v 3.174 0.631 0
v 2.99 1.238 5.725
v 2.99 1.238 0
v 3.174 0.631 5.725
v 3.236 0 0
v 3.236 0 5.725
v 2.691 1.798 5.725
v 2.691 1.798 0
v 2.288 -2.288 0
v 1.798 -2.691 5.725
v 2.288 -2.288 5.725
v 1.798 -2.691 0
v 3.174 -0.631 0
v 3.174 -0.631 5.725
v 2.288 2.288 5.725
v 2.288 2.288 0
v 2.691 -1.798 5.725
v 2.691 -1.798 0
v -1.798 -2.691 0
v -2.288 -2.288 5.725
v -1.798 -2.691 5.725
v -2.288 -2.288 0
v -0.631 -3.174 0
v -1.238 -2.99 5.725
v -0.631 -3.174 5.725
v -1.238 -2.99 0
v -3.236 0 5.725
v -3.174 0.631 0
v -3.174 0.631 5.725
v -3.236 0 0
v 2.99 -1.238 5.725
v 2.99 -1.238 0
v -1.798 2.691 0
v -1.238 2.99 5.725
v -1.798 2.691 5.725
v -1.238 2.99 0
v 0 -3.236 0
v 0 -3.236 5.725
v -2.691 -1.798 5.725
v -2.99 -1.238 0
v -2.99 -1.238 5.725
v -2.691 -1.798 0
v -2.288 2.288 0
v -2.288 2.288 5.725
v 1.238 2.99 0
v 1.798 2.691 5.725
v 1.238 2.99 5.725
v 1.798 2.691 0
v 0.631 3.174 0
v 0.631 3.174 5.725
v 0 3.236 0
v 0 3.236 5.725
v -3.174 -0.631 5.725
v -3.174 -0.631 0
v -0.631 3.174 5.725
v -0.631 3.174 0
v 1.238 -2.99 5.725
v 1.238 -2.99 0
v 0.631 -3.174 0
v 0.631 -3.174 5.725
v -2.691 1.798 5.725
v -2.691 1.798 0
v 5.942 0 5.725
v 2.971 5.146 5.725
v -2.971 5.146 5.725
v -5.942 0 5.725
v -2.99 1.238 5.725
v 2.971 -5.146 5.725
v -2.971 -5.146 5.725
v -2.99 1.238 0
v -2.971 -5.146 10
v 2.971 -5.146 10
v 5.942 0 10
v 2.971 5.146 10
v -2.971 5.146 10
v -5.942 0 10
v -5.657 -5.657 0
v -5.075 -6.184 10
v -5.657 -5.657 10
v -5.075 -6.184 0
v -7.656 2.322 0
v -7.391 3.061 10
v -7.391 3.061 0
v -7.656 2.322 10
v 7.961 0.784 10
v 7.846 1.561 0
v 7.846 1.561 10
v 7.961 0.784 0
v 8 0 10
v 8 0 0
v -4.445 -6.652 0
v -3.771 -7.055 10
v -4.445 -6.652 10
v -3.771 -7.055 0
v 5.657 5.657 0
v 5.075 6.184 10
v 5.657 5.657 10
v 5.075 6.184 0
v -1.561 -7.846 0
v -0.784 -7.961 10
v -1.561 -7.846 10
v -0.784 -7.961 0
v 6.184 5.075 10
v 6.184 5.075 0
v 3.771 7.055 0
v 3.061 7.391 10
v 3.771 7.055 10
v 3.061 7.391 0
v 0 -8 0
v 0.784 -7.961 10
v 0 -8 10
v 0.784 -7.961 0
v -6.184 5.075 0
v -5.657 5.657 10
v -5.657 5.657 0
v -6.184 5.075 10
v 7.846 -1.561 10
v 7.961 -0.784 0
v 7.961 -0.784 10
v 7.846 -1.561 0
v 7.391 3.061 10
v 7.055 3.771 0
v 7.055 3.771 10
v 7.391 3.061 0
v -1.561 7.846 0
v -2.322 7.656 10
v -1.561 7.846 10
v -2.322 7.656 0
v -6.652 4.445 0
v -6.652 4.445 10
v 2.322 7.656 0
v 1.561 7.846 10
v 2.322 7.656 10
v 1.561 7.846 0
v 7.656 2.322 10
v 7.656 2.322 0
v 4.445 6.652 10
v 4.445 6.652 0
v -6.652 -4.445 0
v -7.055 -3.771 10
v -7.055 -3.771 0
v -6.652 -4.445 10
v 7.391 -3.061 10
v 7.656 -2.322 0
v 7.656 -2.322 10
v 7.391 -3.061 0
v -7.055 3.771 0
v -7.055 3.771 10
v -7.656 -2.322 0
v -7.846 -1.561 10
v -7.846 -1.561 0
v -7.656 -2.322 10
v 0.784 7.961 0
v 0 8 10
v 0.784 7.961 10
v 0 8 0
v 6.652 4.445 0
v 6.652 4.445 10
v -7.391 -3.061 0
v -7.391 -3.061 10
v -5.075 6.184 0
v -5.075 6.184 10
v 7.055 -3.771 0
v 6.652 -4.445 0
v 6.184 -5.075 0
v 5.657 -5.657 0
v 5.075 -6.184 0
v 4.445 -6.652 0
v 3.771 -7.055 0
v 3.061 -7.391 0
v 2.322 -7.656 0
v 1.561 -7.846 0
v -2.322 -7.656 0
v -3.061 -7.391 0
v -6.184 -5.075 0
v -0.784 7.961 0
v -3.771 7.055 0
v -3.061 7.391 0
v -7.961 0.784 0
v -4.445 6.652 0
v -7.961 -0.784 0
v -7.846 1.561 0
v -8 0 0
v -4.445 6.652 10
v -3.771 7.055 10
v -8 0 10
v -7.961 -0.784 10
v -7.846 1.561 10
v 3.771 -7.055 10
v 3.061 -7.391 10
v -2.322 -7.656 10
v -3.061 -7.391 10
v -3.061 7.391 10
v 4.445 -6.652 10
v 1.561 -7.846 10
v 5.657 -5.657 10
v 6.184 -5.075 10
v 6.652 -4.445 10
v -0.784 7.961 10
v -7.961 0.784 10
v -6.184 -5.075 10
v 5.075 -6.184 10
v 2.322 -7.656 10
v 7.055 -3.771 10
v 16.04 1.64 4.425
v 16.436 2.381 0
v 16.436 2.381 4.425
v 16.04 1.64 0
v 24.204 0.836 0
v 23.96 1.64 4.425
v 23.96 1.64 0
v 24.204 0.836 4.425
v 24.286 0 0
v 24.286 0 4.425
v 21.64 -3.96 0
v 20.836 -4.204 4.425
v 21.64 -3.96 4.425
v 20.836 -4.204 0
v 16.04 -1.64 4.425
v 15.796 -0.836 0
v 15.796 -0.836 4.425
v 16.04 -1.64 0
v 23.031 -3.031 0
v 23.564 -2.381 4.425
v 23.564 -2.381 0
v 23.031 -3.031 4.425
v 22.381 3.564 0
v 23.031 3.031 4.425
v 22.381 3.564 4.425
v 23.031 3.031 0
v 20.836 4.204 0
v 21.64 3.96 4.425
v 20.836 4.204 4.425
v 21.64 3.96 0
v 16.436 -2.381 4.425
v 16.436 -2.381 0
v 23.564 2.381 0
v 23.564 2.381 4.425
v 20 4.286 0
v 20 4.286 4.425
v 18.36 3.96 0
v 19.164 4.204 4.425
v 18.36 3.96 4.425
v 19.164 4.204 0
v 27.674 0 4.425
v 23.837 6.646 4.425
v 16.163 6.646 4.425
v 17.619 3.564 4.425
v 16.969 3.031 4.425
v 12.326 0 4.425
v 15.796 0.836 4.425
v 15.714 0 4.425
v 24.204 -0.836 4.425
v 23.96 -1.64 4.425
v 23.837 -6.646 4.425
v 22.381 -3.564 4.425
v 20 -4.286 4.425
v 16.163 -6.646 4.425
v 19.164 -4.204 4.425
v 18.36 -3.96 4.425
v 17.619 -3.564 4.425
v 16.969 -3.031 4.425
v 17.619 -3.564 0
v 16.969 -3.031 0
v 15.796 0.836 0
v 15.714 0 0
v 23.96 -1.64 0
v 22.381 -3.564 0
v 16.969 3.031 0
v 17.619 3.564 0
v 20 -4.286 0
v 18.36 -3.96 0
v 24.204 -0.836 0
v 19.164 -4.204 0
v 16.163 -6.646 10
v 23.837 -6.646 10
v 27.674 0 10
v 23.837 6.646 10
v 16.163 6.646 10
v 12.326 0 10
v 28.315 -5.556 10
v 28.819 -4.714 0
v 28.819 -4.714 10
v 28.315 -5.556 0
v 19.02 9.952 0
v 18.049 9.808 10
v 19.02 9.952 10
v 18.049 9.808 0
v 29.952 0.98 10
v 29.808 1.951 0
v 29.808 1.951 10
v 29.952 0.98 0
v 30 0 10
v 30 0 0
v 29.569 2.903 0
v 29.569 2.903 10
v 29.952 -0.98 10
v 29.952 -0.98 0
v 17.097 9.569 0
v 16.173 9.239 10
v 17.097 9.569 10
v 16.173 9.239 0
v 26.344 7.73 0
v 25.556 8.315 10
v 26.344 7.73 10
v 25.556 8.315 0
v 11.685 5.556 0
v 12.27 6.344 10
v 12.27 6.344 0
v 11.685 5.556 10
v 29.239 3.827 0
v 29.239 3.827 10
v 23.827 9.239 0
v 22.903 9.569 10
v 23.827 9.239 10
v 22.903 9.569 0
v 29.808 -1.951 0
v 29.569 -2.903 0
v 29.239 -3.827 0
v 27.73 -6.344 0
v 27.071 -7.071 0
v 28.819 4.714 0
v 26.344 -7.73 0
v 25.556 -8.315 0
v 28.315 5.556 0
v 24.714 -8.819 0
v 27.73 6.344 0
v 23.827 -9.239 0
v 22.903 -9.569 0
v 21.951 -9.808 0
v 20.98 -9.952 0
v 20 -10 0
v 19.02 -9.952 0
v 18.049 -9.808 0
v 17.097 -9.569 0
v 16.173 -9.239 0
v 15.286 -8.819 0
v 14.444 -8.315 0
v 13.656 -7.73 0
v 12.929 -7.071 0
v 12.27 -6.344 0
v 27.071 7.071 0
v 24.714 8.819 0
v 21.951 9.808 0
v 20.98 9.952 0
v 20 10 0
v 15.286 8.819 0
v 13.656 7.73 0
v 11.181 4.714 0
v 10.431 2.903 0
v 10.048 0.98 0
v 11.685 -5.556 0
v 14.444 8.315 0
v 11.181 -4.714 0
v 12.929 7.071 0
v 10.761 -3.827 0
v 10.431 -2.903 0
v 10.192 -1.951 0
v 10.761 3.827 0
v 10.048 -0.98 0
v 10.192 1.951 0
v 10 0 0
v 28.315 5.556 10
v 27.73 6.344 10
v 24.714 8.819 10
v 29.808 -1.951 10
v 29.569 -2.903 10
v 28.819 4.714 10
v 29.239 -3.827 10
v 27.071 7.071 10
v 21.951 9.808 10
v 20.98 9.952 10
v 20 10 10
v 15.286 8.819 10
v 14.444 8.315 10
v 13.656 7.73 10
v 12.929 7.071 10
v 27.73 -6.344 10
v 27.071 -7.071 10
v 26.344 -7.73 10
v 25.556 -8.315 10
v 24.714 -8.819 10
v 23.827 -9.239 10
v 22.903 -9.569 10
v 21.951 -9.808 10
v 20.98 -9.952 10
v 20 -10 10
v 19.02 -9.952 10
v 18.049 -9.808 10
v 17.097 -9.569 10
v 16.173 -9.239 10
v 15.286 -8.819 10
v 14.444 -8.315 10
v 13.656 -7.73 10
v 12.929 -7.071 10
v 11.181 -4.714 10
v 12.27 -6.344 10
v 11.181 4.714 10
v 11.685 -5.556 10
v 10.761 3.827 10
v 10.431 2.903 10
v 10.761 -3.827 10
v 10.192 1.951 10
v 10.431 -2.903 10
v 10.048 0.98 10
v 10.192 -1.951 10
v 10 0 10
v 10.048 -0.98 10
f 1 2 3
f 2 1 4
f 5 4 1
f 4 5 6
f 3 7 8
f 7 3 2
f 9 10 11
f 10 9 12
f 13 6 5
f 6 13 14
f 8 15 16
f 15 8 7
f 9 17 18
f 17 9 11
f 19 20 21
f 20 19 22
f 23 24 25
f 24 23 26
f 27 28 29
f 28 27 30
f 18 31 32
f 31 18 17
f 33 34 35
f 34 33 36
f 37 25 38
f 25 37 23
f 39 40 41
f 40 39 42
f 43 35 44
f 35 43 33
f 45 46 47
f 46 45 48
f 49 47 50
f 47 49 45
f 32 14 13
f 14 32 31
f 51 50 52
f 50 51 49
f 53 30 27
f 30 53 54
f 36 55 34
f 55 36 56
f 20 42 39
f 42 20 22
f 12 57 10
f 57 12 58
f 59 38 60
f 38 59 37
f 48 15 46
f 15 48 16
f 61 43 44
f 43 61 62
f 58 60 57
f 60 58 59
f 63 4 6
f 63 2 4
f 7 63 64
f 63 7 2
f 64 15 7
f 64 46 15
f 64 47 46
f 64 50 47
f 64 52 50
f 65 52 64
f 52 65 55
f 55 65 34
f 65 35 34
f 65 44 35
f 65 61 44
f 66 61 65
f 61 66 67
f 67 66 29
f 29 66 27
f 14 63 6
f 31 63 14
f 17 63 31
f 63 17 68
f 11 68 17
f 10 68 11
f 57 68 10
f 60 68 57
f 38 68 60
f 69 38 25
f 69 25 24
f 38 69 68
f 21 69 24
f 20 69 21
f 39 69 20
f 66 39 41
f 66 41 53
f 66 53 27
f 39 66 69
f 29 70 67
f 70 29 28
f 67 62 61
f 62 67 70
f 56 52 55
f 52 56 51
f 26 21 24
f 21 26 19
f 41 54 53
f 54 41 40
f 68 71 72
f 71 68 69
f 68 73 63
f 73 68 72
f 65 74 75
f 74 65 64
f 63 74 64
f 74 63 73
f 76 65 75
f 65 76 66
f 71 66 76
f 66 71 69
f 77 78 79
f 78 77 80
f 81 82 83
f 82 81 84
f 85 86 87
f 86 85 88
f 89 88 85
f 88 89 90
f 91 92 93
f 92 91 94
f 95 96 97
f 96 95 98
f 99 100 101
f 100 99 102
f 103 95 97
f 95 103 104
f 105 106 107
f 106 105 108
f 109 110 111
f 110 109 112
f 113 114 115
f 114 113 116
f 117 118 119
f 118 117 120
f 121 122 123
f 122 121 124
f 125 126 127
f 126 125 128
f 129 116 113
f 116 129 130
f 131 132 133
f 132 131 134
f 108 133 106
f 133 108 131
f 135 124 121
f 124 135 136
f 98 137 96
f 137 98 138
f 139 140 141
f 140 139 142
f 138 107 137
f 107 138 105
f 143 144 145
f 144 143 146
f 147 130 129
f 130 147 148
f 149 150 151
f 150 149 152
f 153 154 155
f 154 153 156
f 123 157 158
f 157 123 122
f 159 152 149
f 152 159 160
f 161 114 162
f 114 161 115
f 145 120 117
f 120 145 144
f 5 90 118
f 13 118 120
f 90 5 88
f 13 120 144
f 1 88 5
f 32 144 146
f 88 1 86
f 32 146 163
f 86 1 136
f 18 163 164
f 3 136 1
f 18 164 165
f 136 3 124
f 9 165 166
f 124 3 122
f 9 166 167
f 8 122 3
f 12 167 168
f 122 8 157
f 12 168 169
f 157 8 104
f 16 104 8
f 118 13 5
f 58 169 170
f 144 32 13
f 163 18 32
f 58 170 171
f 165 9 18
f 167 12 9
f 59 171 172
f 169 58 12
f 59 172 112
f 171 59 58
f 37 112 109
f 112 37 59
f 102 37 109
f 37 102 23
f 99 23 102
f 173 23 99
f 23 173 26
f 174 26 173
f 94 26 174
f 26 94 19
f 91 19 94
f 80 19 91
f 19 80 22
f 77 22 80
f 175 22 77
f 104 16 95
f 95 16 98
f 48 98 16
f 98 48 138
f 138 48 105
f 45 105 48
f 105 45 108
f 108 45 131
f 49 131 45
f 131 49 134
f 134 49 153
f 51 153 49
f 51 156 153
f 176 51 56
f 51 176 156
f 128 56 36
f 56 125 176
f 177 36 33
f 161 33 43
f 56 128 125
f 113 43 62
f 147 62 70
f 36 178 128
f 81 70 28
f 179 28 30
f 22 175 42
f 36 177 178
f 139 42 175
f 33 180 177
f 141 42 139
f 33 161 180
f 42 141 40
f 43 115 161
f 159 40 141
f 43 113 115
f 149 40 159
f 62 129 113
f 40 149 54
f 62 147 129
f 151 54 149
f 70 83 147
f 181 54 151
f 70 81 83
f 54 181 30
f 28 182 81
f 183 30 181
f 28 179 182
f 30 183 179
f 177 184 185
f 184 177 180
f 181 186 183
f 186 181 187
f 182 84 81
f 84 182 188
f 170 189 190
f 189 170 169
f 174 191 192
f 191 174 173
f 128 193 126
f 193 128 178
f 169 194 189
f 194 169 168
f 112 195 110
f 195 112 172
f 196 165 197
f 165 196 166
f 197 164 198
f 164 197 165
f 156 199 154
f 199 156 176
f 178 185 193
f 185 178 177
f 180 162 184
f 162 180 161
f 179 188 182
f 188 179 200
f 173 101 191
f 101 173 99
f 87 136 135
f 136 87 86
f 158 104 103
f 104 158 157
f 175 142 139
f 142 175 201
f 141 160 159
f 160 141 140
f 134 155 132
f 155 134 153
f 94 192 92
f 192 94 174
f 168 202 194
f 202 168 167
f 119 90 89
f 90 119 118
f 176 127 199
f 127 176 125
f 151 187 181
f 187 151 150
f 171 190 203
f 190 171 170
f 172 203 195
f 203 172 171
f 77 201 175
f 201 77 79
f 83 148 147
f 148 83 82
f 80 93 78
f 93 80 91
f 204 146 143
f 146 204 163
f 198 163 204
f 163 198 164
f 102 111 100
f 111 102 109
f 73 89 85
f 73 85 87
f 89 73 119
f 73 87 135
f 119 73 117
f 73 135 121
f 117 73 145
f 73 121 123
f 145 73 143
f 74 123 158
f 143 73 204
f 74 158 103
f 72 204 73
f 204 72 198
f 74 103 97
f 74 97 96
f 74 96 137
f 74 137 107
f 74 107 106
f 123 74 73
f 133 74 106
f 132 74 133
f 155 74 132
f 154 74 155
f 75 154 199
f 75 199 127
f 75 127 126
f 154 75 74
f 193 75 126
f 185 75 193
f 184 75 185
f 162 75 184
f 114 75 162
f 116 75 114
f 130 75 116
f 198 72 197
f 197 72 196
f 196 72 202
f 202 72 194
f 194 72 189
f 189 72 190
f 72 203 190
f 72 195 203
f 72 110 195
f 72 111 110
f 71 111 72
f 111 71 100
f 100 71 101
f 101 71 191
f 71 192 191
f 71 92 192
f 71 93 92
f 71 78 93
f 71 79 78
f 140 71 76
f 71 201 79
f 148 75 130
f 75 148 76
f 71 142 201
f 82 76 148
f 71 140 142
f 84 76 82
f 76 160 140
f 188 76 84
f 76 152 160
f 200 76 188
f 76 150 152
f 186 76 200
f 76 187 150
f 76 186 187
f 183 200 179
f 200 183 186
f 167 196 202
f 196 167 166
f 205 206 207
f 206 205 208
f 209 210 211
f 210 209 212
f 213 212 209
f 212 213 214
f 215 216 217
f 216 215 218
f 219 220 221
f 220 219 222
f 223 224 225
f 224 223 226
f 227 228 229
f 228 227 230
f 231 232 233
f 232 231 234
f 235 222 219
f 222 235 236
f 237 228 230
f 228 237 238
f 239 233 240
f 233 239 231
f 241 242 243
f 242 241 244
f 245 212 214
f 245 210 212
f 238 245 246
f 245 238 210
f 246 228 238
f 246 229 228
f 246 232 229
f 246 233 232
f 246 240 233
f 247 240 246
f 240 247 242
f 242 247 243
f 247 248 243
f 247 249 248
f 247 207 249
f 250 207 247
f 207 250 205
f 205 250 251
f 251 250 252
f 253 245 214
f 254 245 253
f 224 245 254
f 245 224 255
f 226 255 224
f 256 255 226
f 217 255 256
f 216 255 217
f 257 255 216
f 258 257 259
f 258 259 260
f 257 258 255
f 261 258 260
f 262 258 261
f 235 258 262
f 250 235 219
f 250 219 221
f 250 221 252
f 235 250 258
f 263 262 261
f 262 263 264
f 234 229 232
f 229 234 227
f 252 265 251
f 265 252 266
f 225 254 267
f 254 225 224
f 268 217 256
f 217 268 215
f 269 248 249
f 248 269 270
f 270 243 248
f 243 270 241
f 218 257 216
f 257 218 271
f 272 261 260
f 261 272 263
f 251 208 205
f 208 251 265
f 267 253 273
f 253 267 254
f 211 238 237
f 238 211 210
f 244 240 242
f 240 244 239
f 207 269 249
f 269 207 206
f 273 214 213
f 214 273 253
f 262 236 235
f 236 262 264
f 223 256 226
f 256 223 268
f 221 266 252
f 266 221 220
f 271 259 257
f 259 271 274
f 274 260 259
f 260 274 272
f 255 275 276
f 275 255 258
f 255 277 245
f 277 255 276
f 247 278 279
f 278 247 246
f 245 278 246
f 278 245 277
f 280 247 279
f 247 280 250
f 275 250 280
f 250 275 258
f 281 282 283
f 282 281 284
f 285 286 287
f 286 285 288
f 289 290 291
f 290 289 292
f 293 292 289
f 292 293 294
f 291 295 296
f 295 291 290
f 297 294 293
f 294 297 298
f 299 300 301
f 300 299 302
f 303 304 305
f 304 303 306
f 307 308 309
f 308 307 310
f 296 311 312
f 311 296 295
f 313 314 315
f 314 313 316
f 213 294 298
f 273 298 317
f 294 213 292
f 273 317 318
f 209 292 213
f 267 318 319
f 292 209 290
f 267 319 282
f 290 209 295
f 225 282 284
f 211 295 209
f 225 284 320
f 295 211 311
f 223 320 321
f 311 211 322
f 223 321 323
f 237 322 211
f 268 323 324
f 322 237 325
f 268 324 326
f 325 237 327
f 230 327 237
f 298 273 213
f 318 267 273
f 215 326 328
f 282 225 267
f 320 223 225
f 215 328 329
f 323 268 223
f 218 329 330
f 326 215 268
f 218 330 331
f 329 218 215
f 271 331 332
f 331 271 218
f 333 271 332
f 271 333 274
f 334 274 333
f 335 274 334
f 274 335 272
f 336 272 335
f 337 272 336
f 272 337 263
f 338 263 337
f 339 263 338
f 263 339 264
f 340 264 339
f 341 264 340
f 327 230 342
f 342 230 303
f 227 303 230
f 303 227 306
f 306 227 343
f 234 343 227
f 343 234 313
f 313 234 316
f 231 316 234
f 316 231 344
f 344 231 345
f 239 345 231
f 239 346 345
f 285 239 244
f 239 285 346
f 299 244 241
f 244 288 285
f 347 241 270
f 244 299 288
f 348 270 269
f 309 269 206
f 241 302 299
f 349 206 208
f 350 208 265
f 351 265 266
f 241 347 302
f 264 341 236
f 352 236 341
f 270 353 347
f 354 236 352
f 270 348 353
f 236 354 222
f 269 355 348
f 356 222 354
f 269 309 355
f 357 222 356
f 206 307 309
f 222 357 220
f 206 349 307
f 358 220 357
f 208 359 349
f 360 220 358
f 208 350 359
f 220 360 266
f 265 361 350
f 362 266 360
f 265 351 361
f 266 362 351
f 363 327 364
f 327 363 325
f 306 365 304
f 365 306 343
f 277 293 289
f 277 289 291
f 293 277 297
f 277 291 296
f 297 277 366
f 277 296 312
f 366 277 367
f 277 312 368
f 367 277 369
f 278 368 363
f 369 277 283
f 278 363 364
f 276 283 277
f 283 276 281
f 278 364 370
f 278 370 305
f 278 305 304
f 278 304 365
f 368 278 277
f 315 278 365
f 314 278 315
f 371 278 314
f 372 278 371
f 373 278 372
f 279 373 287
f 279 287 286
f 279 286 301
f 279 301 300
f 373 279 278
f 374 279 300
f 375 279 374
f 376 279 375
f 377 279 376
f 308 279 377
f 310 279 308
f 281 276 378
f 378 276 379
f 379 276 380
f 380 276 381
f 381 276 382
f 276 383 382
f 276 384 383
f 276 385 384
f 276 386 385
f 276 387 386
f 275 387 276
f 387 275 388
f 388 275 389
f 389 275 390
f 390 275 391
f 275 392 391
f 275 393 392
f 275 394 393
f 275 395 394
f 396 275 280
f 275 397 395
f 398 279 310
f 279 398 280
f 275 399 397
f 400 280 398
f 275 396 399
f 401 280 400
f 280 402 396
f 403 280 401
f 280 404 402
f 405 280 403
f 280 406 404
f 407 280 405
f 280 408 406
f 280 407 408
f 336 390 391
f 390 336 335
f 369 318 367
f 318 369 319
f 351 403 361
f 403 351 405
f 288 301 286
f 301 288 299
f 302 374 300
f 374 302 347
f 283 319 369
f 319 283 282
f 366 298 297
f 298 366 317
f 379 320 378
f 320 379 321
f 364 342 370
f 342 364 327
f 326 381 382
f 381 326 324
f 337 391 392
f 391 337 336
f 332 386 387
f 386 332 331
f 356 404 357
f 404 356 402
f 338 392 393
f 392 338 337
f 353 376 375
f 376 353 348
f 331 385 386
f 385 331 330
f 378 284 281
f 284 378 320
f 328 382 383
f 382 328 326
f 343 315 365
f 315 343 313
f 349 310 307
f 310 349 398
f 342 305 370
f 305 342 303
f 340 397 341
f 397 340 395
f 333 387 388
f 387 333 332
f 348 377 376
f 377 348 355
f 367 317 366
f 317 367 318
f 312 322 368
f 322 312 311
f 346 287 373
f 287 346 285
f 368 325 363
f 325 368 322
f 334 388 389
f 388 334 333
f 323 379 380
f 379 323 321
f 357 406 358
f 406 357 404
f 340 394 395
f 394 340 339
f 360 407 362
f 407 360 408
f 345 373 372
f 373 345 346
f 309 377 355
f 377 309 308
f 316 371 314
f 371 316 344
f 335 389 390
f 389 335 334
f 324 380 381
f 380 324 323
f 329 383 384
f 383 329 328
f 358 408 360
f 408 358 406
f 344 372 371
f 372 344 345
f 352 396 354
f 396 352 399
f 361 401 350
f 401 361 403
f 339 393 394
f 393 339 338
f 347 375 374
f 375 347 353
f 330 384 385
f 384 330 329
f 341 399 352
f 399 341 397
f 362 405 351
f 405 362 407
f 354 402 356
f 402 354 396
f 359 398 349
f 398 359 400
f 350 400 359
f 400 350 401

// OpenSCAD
include <nuts_and_bolts_v1.95.scad>

//SC8UU bearing block
quality=36; //set to 36 before editing, set 360 before compiling
W=80; // Height of main block
H=80; // Height of main block
D=6; // Depth of main block


shaft=8; //8mm rail
m3bolt=3; //m3
m4bolt=4; //m4

m3nut=5.5; //m3 nut size

nozzle=0.4; //hole exact fit
vint=3; //shaft lock m3

BW=30; // Bearing outer width
BH=34; // Bearing outer height
BD=22.3; // Bearing outer depth

//  hex_nut (height, thread_d, size, tolerance, quality, thread, pitch);

/*******************************************************************/
/**  Nut bolts                                                    **/
/*******************************************************************/
module m2_5_nut(x, y, z) {
    translate ([x, y, z]) hex_nut (2, 2.6, 5, 1/128, 32, 0, "metric", thread ? 0.45 : "");
}

module m3_nut(x, y, z, thread) {
    translate ([x, y, z]) hex_nut (2.6, 3.1, 5.5, 1/128, 32, 0, "metric", thread ? 0.5 : "");
}

module m4_nut(x, y, z, thread) {
    translate ([x, y, z]) hex_nut (3.44, 4.1, 7, 1/128, 32, 0, "metric", thread ? 0.7 : "");
}

module m5_nut(x, y, z, thread) {
    translate ([x, y, z]) hex_nut (4.24, 5.1, 8, 1/128, 32, 0, "metric", thread ? 0.8 : "");

}

module m6_nut(x, y, z, thread) {
    translate ([x, y, z]) hex_nut (5.24, 6.1, 10, 1/128, 32, 0, "metric", thread ? 1.0 : "");

}

module m8_nut(x, y, z, thread) {
    translate ([x, y, z]) hex_nut (6.24, 8.1, 14, 1/128, 32, 0, "metric" , thread ? 1.25 : "");
}

module m10_nut(x, y, z, thread) {
    translate ([x, y, z]) hex_nut (8.4, 10.1, 16, 1/128, 32, 0, "metric" , thread ? 1.5 : "");
}

/*******************************************************************/
/**  Hex bolts                                                    **/
/*******************************************************************/
//  hex_bolt (lenght, thread_d, head_h, head_d, tolerance, quality, thread, pitch);
module m2_5_hexbolt(x, y, z, length, as_insert, thread) {
    translate ([x, y, z + length + 1.9])
        rotate([0, 180, 0])
            hex_bolt (length, 2.98, 1.9, 5, 1/128, 32, 0, "metric", thread ? 1 : 0, 0.45);
}

module m3_hexbolt(x, y, z, length, as_insert, thread) {
    head_size = as_insert ? 5.5: 5.75;
    head_thickness = 2.2;    
    translate ([x, y, z + length + head_thickness])
        rotate([0, 180, 0])
            hex_bolt (length, 3.48, head_thickness, head_size, 1/128, 32, 0, "metric", thread ? 1 : 0, 0.5);
}

module m4_hexbolt(x, y, z, length, as_insert, thread) {
    head_size = as_insert ? 7.25 : 7;
    head_thickness = 3.1;
    translate ([x, y, z + length + head_thickness])
        rotate([0, 180, 0])
            hex_bolt (length, 4.48, head_thickness, head_size, 1/128, 32, 0, "metric", thread ? 1 : 0, 0.7);
}

module m5_hexbolt(x, y, z, length, as_insert, thread) {
    head_size = as_insert ? 8.28 : 8;
    head_thickness = 3.875;
    translate ([x, y, z + length + head_thickness])
        rotate([0, 180, 0])
            hex_bolt (length, 5.48, head_thickness, head_size, 1/128, 64, 0, "metric", thread ? 1 : 0, 0.8);
}

module m6_hexbolt(x, y, z, length, as_insert, thread) {
    head_size = as_insert ? 10.3 : 10;
    head_thickness = 4.375;
    translate ([x, y, z + length + head_thickness])
        rotate([0, 180, 0])
            hex_bolt (length, 6.48, head_thickness, head_size, 1/128, 64, 0, "metric", thread ? 1 : 0, 1);
}

module m8_hexbolt(x, y, z, length, as_insert, thread) {
    head_size = as_insert ? 13.3 : 13;
    head_thickness = 5.675;
    translate ([x, y, z + length + head_thickness])
        rotate([0, 180, 0])
            hex_bolt (length, 8.58, head_thickness, head_size, 1/128, 64, 0, "metric", thread ? 1 : 0, 1.25);
}

module m10_hexbolt(x, y, z, length, as_insert, thread) {
    head_size = as_insert ? 16.3 : 16;
    head_thickness = 6.85;
    translate ([x, y, z + length + head_thickness])
        rotate([0, 180, 0])
            hex_bolt (length, 10.58, head_thickness, head_size, 1/128, 128, 0, "metric", thread ? 1 : 0, 1.5);
}


/*******************************************************************/
/**  Test prints for hex nut inserts                              **/
/*******************************************************************/
module m4_test(x, y, z) {
    difference() {
        translate ([x, y, z]) cube([12, 12, 6]);
        rotate([0, 180, 0]) m4_hexbolt(-x - 6, y + 6, -z - 6.1, 2.5 + 3.7, "ins");
    }
}

module m5_test(x, y, z) {
    difference() {
        translate ([x, y, z]) cube([12, 12, 6]);
        rotate([0, 180, 0]) m5_hexbolt(-x - 6, y + 6, -z - 6.1, 2.5 + 3.7, "ins");
    }
}

module m6_test(x, y, z) {
    difference() {
        translate ([x, y, z]) cylinder(r=8, h=10, $fn=64);
        rotate([0, 180, 0]) m6_hexbolt(x, y , z - 10.1, 2.5 + 3.7, "ins");
    }
}

module m8_test(x, y, z) {
    difference() {
        translate ([x, y, z]) cylinder(r=10, h=10, $fn=64);
        rotate([0, 180, 0]) m8_hexbolt(-x, y , z - 10.1, 2.5 + 3.7, "ins");
    }
}


module bearing_holes(x, y, z) {
        // Lower left
        translate ([x + 6,      y + 5,      z - 0.5]) cylinder(d=4, h=BD + 1, $fn=quality);
        // Lower right
        translate ([x + BW - 6, y + 5,      z - 0.5]) cylinder(d=4, h=BD + 1, $fn=quality);
        // Upper left
        translate ([x + 6,      y + BH - 5, z - 0.5]) cylinder(d=4, h=BD + 1, $fn=quality);
        // Upper right
        translate ([x + BW - 6, y + BH - 5, z - 0.5]) cylinder(d=4, h=BD + 1, $fn=quality);
}

module bearing(x, y, z) {
    difference() {
        difference() {
            // Main cube
            translate ([x, y, z]) cube([BW, BH, BD]);
            // And the four holes
            bearing_holes(x, y, z);
        }
    
        // The hole for the shaft
        translate ([x - 0.5, y + (BH/2), z + 11]) rotate([0, 90, 0]) cylinder(d=shaft, h=BW + 1, $fn=quality);
    }
}

module inv_bearing(x, y, z) {
    color("Green");
    intersection() {
        bearing_holes(x, y, z);
        translate ([x, y, z]) cube([BW, BH, BD]);
    }
}

XC_W = 20;
XC_H = H;
XC_D = 25;
module x_carriage_mount(x, y, z) {
    translate ([x, y, z]) cube ([XC_W, XC_H, XC_D]);
}

module main_block(x, y, z) {
    color("Blue");
    difference () {
        translate ([x, y, z]) cube ([W, H, D]);
    
        // Start carveout
        translate ([x, y, z - 0.5]) cube(r=30, h=D + 1);
        translate ([x + W, y, z - 0.5]) cube(r=30, h=D + 1);
        
//        translate ([x, y, z - 0.5]) cylinder(r=30, h=D+1, $fn=quality);
//        translate ([x + W, y, z - 0.5]) cylinder(r=30, h=D+1, $fn=quality);
    }
}



//main_block(0, 0, 0);
//bearing(0, H/2 - 2, 0);
//bearing(W - BW, H/2 - 2, 0);
//x_carriage_mount(W/2 - XC_W/2, 0, 0);
//inv_bearing(0, 0, 0);

m6_test(0, 0, 0);
m8_test(20, 0, 0);


//m3_hexbolt(0, 20, 0, 2.5);
//m3_nut(10, 20, 0);
//
//m4_hexbolt(0, 10, 0, 2.5);
//m4_nut(10, 10, 0);
//
//m5_hexbolt(0, 0, 0, 2.5);
//m5_nut(11, 0, 0);
//
//m6_hexbolt(0, -11, 0, 2.5);
//m6_nut(14, -11, 0);
//
//m8_hexbolt(0, -25, 0, 2.5);
//m8_nut(18, -25, 0);
//
//m10_hexbolt(0, -43, 0, 2.5 );
//m10_nut(23, -43, 0);



//m3_nut(0, -10, 0);
//
//m4_nut(10, -10, 0);
//
//m5_nut(20, -10, 0);
//m5_nut(20, -30, 0, "with_thread");
//
//m6_nut(33, -10, 0);
//m6_nut(33, -30, 0, "with_thread");
//
//m8_nut(50, -10, 0);
//m8_nut(50, -30, 0, "with_thread");
